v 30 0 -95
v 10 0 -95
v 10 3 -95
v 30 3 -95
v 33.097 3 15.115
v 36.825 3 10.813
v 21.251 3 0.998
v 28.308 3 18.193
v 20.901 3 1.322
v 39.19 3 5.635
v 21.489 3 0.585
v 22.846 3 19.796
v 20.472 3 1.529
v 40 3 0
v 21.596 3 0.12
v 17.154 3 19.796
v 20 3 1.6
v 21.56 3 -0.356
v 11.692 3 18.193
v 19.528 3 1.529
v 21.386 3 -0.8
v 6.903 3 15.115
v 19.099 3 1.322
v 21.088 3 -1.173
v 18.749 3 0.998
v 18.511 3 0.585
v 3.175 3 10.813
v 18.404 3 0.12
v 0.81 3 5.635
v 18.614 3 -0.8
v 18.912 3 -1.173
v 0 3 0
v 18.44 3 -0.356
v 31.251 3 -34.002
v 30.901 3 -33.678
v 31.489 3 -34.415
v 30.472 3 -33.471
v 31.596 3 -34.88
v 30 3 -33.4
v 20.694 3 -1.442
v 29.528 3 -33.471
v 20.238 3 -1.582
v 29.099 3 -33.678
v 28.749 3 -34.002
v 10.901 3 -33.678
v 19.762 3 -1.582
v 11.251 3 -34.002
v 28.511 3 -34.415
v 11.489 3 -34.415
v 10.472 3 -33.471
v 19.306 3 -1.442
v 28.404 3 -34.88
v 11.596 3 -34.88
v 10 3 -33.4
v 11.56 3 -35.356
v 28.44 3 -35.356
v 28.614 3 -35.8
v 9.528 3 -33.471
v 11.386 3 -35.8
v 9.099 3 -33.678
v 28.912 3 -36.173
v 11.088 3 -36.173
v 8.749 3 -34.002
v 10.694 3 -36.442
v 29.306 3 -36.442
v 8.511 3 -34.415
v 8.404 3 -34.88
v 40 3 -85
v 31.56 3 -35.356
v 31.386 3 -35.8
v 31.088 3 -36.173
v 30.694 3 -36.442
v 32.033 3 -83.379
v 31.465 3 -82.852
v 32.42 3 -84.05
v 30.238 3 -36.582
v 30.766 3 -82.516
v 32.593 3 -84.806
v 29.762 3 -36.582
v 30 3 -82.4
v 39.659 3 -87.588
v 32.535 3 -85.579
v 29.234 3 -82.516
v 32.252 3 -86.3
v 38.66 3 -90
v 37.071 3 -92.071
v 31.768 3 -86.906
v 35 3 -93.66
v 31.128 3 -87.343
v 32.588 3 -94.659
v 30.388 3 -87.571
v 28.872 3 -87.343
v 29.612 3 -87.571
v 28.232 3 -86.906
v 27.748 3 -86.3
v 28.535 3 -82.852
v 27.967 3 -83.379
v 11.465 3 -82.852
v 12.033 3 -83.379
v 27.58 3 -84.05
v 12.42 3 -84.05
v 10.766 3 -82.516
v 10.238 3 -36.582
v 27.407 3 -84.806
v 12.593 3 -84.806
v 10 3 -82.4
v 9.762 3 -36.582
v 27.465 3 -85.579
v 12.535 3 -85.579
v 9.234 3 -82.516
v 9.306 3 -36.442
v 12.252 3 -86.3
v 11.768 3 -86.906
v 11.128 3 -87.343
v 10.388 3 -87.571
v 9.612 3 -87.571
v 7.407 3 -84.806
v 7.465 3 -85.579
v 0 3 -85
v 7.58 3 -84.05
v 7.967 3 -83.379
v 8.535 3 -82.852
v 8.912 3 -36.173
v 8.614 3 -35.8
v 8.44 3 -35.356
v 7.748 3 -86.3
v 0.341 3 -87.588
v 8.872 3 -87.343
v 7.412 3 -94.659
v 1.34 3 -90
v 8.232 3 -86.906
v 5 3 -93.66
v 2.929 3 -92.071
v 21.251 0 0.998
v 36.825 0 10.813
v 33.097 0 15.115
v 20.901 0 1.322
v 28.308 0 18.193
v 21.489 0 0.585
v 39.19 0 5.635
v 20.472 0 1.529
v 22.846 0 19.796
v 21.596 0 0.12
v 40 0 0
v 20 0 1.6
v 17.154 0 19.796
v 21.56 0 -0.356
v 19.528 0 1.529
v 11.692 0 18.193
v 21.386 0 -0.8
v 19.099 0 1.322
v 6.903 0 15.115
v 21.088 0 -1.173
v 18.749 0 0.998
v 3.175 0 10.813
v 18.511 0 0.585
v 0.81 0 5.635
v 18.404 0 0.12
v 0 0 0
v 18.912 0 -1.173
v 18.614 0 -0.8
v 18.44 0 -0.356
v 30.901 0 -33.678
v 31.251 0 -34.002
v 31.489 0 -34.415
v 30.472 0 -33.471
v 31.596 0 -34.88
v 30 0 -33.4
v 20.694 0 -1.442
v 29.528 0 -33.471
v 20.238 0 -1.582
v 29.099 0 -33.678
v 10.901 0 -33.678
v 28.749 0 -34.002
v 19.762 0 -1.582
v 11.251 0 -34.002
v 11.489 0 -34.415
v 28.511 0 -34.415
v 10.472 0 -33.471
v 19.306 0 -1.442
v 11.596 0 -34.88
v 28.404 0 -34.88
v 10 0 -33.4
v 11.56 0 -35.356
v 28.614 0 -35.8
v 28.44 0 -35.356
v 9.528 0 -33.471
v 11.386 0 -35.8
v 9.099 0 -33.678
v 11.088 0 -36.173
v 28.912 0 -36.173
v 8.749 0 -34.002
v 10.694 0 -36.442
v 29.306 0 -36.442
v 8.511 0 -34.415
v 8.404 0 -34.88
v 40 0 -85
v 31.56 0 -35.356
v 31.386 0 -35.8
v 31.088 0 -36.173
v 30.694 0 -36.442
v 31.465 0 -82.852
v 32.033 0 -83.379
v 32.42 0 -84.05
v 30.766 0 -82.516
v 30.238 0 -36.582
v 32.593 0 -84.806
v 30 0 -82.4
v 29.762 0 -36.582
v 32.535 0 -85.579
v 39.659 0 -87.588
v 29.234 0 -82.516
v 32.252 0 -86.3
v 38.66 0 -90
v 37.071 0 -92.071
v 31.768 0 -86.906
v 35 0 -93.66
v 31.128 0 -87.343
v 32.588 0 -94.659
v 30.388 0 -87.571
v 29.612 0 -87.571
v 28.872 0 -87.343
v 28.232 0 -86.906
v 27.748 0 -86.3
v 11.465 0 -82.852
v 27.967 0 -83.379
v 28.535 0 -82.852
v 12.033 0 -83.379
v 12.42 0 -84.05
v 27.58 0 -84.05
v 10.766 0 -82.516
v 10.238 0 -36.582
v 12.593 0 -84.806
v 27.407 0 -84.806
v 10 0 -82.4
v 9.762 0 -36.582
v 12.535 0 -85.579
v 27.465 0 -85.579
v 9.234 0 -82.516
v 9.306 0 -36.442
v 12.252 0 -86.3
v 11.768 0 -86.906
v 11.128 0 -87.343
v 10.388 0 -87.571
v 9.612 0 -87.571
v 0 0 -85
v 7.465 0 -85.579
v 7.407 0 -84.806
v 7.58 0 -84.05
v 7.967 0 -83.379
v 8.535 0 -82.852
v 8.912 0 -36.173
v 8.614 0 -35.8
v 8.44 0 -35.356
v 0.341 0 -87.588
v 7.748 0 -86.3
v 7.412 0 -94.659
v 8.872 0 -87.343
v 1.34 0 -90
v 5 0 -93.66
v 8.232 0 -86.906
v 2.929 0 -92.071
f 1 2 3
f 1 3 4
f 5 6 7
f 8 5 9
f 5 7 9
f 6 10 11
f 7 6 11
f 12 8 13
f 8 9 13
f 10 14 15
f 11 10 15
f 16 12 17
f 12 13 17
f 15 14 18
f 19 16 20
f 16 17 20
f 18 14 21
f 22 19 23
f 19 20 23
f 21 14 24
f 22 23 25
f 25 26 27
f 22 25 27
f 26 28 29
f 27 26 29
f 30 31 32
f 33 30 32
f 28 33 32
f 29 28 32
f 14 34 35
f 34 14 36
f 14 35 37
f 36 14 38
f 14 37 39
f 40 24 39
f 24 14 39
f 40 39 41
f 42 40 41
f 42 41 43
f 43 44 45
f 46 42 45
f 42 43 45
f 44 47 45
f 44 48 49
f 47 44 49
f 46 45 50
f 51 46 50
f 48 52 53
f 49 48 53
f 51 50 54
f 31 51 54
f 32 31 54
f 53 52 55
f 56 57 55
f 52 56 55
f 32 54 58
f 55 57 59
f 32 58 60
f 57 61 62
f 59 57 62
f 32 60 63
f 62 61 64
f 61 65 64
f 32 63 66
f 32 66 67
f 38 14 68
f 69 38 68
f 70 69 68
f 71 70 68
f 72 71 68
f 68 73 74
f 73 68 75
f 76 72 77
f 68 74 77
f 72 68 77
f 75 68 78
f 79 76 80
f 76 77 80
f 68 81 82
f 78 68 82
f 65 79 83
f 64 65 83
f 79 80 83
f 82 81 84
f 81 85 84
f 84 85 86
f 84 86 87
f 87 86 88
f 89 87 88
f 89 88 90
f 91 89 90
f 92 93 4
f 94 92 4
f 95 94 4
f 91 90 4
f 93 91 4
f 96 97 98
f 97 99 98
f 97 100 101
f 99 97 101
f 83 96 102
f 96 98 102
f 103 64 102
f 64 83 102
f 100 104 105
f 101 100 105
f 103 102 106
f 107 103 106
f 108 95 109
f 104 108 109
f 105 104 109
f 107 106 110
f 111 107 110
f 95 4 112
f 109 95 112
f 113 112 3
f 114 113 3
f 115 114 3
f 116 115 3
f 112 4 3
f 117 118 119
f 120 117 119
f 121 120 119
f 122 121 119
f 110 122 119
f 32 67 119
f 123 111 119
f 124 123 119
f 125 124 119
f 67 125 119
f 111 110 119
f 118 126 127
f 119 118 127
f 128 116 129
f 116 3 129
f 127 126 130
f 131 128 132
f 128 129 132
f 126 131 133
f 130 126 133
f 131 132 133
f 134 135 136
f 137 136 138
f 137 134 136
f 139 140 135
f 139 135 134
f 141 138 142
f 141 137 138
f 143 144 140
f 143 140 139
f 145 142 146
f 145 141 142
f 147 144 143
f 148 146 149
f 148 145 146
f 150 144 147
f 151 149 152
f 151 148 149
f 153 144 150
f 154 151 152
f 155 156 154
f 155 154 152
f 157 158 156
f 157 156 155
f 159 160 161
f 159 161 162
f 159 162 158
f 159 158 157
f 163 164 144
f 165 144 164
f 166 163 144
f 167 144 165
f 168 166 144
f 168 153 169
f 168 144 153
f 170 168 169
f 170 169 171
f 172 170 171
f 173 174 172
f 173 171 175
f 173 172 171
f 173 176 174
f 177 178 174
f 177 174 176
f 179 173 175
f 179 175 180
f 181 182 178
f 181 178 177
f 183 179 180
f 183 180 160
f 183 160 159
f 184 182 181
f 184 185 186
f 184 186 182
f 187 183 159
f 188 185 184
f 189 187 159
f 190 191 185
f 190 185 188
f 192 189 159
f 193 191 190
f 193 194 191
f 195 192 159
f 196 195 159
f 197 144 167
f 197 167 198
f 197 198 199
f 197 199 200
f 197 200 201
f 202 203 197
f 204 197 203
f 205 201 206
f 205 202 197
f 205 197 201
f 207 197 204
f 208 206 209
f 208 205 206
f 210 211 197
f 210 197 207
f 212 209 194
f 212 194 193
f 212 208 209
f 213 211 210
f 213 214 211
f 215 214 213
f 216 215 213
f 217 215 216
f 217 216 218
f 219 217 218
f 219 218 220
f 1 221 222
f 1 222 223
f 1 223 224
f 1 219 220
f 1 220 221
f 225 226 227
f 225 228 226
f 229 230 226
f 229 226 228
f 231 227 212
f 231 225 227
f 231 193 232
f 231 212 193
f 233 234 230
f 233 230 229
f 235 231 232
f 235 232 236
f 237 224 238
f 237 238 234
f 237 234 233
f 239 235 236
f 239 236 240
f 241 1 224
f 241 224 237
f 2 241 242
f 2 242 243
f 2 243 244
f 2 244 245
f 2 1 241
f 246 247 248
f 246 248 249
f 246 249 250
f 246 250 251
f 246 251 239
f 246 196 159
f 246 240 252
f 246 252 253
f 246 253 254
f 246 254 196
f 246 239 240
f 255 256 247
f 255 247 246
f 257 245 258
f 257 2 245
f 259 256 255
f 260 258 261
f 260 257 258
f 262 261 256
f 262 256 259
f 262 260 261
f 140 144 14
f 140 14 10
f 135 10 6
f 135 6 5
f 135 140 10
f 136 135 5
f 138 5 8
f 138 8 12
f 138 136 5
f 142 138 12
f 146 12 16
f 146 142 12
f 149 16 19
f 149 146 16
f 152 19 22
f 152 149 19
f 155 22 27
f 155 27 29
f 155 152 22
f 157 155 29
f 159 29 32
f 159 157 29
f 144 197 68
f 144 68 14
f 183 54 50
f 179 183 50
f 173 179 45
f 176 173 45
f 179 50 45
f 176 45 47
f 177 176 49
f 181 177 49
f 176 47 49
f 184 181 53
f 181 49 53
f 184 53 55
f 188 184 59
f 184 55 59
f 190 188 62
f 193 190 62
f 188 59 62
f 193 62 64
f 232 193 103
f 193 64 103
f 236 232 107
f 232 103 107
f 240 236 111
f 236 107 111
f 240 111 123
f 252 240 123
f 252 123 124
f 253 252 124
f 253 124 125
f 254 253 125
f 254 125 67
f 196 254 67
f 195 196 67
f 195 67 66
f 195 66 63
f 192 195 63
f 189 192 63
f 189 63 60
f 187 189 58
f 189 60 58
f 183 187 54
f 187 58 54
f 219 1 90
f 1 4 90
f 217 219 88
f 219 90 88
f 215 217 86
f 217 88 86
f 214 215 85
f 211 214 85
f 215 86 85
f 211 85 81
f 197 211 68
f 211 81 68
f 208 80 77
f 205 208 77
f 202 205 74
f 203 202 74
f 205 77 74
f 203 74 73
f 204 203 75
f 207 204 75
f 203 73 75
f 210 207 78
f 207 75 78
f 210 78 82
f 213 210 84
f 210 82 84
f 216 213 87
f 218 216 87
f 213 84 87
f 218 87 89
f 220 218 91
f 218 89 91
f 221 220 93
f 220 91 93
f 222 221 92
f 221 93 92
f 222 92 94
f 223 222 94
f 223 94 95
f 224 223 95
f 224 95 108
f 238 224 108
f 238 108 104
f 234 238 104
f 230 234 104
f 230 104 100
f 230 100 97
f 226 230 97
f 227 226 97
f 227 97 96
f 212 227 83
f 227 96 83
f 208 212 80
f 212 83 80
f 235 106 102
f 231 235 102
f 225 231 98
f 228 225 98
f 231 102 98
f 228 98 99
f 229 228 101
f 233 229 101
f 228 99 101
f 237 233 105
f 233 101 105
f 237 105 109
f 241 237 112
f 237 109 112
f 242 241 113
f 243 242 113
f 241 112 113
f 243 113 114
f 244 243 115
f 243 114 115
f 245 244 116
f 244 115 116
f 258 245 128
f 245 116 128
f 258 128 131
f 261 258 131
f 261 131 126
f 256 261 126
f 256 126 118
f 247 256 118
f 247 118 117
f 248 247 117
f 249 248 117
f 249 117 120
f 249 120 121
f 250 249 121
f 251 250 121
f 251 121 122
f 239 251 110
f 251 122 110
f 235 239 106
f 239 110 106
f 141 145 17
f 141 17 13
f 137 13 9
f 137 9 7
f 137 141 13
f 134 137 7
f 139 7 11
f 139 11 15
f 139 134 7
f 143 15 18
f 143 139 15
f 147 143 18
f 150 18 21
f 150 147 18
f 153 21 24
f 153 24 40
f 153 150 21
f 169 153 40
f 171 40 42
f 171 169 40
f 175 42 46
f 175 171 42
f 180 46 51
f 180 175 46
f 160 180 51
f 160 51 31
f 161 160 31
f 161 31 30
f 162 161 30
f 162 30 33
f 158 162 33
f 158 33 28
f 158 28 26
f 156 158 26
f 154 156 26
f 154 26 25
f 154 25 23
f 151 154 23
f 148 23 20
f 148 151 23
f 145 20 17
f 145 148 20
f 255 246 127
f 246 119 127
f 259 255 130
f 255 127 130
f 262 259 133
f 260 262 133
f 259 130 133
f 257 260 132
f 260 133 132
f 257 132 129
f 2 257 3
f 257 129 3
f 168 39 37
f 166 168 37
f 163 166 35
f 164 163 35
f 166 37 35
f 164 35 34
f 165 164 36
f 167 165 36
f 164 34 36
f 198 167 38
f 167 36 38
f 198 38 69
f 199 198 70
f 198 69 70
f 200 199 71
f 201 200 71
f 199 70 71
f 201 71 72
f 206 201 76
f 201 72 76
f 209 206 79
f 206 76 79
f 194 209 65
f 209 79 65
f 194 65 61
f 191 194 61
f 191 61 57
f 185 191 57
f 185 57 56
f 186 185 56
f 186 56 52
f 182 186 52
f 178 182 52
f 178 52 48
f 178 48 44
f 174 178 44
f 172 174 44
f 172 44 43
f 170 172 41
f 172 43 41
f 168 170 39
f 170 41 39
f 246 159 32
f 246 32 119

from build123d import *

# Parameters (mm, degrees)
SKETCH1_R           = 1.6
BOSS_EXTRUDE1_DEPTH = 3
SKETCH3_R           = 2.6
SKETCH3_R_2         = 1.6
CUT_EXTRUDE2_DEPTH  = 3
FILLET2_R           = 10


with BuildPart() as part:
    # Sketch1 → Boss-Extrude1 (new body)
    with BuildSketch(Plane(origin=(0, 0, 0), x_dir=(1, 0, 0), z_dir=(0, 1, 0))):
        with BuildLine():
            Line((0, 0), (0, 95))
            Line((0, 95), (40, 95))
            Line((40, 95), (40, 0))
            ThreePointArc((40, 0), (20, -20), (0, 0))
        make_face()
        with Locations(Location((20, 0, 0), (0, 0, 270))):
            Circle(SKETCH1_R, mode=Mode.SUBTRACT)
    extrude(amount=BOSS_EXTRUDE1_DEPTH)

    # Sketch3 → Cut-Extrude2 (cut)
    with BuildSketch(Plane(origin=(0, 3, 0), x_dir=(1, 0, 0), z_dir=(0, 1, 0))):
        with Locations(Location((10, 85, 0), (0, 0, 270))):
            Circle(SKETCH3_R)
        with Locations(Location((30, 85, 0), (0, 0, 270))):
            Circle(SKETCH3_R)
        with Locations(Location((10, 35, 0), (0, 0, 270))):
            Circle(SKETCH3_R_2)
        with Locations(Location((30, 35, 0), (0, 0, 270))):
            Circle(SKETCH3_R_2)
    extrude(amount=-CUT_EXTRUDE2_DEPTH, mode=Mode.SUBTRACT)

    # Fillet2
    fillet2_edges = [part.edges().sort_by_distance(p)[0] for p in [
        (0, 1.5, -95),
        (40, 1.5, -95),
    ]]
    fillet(fillet2_edges, radius=FILLET2_R)


solid = part.part
